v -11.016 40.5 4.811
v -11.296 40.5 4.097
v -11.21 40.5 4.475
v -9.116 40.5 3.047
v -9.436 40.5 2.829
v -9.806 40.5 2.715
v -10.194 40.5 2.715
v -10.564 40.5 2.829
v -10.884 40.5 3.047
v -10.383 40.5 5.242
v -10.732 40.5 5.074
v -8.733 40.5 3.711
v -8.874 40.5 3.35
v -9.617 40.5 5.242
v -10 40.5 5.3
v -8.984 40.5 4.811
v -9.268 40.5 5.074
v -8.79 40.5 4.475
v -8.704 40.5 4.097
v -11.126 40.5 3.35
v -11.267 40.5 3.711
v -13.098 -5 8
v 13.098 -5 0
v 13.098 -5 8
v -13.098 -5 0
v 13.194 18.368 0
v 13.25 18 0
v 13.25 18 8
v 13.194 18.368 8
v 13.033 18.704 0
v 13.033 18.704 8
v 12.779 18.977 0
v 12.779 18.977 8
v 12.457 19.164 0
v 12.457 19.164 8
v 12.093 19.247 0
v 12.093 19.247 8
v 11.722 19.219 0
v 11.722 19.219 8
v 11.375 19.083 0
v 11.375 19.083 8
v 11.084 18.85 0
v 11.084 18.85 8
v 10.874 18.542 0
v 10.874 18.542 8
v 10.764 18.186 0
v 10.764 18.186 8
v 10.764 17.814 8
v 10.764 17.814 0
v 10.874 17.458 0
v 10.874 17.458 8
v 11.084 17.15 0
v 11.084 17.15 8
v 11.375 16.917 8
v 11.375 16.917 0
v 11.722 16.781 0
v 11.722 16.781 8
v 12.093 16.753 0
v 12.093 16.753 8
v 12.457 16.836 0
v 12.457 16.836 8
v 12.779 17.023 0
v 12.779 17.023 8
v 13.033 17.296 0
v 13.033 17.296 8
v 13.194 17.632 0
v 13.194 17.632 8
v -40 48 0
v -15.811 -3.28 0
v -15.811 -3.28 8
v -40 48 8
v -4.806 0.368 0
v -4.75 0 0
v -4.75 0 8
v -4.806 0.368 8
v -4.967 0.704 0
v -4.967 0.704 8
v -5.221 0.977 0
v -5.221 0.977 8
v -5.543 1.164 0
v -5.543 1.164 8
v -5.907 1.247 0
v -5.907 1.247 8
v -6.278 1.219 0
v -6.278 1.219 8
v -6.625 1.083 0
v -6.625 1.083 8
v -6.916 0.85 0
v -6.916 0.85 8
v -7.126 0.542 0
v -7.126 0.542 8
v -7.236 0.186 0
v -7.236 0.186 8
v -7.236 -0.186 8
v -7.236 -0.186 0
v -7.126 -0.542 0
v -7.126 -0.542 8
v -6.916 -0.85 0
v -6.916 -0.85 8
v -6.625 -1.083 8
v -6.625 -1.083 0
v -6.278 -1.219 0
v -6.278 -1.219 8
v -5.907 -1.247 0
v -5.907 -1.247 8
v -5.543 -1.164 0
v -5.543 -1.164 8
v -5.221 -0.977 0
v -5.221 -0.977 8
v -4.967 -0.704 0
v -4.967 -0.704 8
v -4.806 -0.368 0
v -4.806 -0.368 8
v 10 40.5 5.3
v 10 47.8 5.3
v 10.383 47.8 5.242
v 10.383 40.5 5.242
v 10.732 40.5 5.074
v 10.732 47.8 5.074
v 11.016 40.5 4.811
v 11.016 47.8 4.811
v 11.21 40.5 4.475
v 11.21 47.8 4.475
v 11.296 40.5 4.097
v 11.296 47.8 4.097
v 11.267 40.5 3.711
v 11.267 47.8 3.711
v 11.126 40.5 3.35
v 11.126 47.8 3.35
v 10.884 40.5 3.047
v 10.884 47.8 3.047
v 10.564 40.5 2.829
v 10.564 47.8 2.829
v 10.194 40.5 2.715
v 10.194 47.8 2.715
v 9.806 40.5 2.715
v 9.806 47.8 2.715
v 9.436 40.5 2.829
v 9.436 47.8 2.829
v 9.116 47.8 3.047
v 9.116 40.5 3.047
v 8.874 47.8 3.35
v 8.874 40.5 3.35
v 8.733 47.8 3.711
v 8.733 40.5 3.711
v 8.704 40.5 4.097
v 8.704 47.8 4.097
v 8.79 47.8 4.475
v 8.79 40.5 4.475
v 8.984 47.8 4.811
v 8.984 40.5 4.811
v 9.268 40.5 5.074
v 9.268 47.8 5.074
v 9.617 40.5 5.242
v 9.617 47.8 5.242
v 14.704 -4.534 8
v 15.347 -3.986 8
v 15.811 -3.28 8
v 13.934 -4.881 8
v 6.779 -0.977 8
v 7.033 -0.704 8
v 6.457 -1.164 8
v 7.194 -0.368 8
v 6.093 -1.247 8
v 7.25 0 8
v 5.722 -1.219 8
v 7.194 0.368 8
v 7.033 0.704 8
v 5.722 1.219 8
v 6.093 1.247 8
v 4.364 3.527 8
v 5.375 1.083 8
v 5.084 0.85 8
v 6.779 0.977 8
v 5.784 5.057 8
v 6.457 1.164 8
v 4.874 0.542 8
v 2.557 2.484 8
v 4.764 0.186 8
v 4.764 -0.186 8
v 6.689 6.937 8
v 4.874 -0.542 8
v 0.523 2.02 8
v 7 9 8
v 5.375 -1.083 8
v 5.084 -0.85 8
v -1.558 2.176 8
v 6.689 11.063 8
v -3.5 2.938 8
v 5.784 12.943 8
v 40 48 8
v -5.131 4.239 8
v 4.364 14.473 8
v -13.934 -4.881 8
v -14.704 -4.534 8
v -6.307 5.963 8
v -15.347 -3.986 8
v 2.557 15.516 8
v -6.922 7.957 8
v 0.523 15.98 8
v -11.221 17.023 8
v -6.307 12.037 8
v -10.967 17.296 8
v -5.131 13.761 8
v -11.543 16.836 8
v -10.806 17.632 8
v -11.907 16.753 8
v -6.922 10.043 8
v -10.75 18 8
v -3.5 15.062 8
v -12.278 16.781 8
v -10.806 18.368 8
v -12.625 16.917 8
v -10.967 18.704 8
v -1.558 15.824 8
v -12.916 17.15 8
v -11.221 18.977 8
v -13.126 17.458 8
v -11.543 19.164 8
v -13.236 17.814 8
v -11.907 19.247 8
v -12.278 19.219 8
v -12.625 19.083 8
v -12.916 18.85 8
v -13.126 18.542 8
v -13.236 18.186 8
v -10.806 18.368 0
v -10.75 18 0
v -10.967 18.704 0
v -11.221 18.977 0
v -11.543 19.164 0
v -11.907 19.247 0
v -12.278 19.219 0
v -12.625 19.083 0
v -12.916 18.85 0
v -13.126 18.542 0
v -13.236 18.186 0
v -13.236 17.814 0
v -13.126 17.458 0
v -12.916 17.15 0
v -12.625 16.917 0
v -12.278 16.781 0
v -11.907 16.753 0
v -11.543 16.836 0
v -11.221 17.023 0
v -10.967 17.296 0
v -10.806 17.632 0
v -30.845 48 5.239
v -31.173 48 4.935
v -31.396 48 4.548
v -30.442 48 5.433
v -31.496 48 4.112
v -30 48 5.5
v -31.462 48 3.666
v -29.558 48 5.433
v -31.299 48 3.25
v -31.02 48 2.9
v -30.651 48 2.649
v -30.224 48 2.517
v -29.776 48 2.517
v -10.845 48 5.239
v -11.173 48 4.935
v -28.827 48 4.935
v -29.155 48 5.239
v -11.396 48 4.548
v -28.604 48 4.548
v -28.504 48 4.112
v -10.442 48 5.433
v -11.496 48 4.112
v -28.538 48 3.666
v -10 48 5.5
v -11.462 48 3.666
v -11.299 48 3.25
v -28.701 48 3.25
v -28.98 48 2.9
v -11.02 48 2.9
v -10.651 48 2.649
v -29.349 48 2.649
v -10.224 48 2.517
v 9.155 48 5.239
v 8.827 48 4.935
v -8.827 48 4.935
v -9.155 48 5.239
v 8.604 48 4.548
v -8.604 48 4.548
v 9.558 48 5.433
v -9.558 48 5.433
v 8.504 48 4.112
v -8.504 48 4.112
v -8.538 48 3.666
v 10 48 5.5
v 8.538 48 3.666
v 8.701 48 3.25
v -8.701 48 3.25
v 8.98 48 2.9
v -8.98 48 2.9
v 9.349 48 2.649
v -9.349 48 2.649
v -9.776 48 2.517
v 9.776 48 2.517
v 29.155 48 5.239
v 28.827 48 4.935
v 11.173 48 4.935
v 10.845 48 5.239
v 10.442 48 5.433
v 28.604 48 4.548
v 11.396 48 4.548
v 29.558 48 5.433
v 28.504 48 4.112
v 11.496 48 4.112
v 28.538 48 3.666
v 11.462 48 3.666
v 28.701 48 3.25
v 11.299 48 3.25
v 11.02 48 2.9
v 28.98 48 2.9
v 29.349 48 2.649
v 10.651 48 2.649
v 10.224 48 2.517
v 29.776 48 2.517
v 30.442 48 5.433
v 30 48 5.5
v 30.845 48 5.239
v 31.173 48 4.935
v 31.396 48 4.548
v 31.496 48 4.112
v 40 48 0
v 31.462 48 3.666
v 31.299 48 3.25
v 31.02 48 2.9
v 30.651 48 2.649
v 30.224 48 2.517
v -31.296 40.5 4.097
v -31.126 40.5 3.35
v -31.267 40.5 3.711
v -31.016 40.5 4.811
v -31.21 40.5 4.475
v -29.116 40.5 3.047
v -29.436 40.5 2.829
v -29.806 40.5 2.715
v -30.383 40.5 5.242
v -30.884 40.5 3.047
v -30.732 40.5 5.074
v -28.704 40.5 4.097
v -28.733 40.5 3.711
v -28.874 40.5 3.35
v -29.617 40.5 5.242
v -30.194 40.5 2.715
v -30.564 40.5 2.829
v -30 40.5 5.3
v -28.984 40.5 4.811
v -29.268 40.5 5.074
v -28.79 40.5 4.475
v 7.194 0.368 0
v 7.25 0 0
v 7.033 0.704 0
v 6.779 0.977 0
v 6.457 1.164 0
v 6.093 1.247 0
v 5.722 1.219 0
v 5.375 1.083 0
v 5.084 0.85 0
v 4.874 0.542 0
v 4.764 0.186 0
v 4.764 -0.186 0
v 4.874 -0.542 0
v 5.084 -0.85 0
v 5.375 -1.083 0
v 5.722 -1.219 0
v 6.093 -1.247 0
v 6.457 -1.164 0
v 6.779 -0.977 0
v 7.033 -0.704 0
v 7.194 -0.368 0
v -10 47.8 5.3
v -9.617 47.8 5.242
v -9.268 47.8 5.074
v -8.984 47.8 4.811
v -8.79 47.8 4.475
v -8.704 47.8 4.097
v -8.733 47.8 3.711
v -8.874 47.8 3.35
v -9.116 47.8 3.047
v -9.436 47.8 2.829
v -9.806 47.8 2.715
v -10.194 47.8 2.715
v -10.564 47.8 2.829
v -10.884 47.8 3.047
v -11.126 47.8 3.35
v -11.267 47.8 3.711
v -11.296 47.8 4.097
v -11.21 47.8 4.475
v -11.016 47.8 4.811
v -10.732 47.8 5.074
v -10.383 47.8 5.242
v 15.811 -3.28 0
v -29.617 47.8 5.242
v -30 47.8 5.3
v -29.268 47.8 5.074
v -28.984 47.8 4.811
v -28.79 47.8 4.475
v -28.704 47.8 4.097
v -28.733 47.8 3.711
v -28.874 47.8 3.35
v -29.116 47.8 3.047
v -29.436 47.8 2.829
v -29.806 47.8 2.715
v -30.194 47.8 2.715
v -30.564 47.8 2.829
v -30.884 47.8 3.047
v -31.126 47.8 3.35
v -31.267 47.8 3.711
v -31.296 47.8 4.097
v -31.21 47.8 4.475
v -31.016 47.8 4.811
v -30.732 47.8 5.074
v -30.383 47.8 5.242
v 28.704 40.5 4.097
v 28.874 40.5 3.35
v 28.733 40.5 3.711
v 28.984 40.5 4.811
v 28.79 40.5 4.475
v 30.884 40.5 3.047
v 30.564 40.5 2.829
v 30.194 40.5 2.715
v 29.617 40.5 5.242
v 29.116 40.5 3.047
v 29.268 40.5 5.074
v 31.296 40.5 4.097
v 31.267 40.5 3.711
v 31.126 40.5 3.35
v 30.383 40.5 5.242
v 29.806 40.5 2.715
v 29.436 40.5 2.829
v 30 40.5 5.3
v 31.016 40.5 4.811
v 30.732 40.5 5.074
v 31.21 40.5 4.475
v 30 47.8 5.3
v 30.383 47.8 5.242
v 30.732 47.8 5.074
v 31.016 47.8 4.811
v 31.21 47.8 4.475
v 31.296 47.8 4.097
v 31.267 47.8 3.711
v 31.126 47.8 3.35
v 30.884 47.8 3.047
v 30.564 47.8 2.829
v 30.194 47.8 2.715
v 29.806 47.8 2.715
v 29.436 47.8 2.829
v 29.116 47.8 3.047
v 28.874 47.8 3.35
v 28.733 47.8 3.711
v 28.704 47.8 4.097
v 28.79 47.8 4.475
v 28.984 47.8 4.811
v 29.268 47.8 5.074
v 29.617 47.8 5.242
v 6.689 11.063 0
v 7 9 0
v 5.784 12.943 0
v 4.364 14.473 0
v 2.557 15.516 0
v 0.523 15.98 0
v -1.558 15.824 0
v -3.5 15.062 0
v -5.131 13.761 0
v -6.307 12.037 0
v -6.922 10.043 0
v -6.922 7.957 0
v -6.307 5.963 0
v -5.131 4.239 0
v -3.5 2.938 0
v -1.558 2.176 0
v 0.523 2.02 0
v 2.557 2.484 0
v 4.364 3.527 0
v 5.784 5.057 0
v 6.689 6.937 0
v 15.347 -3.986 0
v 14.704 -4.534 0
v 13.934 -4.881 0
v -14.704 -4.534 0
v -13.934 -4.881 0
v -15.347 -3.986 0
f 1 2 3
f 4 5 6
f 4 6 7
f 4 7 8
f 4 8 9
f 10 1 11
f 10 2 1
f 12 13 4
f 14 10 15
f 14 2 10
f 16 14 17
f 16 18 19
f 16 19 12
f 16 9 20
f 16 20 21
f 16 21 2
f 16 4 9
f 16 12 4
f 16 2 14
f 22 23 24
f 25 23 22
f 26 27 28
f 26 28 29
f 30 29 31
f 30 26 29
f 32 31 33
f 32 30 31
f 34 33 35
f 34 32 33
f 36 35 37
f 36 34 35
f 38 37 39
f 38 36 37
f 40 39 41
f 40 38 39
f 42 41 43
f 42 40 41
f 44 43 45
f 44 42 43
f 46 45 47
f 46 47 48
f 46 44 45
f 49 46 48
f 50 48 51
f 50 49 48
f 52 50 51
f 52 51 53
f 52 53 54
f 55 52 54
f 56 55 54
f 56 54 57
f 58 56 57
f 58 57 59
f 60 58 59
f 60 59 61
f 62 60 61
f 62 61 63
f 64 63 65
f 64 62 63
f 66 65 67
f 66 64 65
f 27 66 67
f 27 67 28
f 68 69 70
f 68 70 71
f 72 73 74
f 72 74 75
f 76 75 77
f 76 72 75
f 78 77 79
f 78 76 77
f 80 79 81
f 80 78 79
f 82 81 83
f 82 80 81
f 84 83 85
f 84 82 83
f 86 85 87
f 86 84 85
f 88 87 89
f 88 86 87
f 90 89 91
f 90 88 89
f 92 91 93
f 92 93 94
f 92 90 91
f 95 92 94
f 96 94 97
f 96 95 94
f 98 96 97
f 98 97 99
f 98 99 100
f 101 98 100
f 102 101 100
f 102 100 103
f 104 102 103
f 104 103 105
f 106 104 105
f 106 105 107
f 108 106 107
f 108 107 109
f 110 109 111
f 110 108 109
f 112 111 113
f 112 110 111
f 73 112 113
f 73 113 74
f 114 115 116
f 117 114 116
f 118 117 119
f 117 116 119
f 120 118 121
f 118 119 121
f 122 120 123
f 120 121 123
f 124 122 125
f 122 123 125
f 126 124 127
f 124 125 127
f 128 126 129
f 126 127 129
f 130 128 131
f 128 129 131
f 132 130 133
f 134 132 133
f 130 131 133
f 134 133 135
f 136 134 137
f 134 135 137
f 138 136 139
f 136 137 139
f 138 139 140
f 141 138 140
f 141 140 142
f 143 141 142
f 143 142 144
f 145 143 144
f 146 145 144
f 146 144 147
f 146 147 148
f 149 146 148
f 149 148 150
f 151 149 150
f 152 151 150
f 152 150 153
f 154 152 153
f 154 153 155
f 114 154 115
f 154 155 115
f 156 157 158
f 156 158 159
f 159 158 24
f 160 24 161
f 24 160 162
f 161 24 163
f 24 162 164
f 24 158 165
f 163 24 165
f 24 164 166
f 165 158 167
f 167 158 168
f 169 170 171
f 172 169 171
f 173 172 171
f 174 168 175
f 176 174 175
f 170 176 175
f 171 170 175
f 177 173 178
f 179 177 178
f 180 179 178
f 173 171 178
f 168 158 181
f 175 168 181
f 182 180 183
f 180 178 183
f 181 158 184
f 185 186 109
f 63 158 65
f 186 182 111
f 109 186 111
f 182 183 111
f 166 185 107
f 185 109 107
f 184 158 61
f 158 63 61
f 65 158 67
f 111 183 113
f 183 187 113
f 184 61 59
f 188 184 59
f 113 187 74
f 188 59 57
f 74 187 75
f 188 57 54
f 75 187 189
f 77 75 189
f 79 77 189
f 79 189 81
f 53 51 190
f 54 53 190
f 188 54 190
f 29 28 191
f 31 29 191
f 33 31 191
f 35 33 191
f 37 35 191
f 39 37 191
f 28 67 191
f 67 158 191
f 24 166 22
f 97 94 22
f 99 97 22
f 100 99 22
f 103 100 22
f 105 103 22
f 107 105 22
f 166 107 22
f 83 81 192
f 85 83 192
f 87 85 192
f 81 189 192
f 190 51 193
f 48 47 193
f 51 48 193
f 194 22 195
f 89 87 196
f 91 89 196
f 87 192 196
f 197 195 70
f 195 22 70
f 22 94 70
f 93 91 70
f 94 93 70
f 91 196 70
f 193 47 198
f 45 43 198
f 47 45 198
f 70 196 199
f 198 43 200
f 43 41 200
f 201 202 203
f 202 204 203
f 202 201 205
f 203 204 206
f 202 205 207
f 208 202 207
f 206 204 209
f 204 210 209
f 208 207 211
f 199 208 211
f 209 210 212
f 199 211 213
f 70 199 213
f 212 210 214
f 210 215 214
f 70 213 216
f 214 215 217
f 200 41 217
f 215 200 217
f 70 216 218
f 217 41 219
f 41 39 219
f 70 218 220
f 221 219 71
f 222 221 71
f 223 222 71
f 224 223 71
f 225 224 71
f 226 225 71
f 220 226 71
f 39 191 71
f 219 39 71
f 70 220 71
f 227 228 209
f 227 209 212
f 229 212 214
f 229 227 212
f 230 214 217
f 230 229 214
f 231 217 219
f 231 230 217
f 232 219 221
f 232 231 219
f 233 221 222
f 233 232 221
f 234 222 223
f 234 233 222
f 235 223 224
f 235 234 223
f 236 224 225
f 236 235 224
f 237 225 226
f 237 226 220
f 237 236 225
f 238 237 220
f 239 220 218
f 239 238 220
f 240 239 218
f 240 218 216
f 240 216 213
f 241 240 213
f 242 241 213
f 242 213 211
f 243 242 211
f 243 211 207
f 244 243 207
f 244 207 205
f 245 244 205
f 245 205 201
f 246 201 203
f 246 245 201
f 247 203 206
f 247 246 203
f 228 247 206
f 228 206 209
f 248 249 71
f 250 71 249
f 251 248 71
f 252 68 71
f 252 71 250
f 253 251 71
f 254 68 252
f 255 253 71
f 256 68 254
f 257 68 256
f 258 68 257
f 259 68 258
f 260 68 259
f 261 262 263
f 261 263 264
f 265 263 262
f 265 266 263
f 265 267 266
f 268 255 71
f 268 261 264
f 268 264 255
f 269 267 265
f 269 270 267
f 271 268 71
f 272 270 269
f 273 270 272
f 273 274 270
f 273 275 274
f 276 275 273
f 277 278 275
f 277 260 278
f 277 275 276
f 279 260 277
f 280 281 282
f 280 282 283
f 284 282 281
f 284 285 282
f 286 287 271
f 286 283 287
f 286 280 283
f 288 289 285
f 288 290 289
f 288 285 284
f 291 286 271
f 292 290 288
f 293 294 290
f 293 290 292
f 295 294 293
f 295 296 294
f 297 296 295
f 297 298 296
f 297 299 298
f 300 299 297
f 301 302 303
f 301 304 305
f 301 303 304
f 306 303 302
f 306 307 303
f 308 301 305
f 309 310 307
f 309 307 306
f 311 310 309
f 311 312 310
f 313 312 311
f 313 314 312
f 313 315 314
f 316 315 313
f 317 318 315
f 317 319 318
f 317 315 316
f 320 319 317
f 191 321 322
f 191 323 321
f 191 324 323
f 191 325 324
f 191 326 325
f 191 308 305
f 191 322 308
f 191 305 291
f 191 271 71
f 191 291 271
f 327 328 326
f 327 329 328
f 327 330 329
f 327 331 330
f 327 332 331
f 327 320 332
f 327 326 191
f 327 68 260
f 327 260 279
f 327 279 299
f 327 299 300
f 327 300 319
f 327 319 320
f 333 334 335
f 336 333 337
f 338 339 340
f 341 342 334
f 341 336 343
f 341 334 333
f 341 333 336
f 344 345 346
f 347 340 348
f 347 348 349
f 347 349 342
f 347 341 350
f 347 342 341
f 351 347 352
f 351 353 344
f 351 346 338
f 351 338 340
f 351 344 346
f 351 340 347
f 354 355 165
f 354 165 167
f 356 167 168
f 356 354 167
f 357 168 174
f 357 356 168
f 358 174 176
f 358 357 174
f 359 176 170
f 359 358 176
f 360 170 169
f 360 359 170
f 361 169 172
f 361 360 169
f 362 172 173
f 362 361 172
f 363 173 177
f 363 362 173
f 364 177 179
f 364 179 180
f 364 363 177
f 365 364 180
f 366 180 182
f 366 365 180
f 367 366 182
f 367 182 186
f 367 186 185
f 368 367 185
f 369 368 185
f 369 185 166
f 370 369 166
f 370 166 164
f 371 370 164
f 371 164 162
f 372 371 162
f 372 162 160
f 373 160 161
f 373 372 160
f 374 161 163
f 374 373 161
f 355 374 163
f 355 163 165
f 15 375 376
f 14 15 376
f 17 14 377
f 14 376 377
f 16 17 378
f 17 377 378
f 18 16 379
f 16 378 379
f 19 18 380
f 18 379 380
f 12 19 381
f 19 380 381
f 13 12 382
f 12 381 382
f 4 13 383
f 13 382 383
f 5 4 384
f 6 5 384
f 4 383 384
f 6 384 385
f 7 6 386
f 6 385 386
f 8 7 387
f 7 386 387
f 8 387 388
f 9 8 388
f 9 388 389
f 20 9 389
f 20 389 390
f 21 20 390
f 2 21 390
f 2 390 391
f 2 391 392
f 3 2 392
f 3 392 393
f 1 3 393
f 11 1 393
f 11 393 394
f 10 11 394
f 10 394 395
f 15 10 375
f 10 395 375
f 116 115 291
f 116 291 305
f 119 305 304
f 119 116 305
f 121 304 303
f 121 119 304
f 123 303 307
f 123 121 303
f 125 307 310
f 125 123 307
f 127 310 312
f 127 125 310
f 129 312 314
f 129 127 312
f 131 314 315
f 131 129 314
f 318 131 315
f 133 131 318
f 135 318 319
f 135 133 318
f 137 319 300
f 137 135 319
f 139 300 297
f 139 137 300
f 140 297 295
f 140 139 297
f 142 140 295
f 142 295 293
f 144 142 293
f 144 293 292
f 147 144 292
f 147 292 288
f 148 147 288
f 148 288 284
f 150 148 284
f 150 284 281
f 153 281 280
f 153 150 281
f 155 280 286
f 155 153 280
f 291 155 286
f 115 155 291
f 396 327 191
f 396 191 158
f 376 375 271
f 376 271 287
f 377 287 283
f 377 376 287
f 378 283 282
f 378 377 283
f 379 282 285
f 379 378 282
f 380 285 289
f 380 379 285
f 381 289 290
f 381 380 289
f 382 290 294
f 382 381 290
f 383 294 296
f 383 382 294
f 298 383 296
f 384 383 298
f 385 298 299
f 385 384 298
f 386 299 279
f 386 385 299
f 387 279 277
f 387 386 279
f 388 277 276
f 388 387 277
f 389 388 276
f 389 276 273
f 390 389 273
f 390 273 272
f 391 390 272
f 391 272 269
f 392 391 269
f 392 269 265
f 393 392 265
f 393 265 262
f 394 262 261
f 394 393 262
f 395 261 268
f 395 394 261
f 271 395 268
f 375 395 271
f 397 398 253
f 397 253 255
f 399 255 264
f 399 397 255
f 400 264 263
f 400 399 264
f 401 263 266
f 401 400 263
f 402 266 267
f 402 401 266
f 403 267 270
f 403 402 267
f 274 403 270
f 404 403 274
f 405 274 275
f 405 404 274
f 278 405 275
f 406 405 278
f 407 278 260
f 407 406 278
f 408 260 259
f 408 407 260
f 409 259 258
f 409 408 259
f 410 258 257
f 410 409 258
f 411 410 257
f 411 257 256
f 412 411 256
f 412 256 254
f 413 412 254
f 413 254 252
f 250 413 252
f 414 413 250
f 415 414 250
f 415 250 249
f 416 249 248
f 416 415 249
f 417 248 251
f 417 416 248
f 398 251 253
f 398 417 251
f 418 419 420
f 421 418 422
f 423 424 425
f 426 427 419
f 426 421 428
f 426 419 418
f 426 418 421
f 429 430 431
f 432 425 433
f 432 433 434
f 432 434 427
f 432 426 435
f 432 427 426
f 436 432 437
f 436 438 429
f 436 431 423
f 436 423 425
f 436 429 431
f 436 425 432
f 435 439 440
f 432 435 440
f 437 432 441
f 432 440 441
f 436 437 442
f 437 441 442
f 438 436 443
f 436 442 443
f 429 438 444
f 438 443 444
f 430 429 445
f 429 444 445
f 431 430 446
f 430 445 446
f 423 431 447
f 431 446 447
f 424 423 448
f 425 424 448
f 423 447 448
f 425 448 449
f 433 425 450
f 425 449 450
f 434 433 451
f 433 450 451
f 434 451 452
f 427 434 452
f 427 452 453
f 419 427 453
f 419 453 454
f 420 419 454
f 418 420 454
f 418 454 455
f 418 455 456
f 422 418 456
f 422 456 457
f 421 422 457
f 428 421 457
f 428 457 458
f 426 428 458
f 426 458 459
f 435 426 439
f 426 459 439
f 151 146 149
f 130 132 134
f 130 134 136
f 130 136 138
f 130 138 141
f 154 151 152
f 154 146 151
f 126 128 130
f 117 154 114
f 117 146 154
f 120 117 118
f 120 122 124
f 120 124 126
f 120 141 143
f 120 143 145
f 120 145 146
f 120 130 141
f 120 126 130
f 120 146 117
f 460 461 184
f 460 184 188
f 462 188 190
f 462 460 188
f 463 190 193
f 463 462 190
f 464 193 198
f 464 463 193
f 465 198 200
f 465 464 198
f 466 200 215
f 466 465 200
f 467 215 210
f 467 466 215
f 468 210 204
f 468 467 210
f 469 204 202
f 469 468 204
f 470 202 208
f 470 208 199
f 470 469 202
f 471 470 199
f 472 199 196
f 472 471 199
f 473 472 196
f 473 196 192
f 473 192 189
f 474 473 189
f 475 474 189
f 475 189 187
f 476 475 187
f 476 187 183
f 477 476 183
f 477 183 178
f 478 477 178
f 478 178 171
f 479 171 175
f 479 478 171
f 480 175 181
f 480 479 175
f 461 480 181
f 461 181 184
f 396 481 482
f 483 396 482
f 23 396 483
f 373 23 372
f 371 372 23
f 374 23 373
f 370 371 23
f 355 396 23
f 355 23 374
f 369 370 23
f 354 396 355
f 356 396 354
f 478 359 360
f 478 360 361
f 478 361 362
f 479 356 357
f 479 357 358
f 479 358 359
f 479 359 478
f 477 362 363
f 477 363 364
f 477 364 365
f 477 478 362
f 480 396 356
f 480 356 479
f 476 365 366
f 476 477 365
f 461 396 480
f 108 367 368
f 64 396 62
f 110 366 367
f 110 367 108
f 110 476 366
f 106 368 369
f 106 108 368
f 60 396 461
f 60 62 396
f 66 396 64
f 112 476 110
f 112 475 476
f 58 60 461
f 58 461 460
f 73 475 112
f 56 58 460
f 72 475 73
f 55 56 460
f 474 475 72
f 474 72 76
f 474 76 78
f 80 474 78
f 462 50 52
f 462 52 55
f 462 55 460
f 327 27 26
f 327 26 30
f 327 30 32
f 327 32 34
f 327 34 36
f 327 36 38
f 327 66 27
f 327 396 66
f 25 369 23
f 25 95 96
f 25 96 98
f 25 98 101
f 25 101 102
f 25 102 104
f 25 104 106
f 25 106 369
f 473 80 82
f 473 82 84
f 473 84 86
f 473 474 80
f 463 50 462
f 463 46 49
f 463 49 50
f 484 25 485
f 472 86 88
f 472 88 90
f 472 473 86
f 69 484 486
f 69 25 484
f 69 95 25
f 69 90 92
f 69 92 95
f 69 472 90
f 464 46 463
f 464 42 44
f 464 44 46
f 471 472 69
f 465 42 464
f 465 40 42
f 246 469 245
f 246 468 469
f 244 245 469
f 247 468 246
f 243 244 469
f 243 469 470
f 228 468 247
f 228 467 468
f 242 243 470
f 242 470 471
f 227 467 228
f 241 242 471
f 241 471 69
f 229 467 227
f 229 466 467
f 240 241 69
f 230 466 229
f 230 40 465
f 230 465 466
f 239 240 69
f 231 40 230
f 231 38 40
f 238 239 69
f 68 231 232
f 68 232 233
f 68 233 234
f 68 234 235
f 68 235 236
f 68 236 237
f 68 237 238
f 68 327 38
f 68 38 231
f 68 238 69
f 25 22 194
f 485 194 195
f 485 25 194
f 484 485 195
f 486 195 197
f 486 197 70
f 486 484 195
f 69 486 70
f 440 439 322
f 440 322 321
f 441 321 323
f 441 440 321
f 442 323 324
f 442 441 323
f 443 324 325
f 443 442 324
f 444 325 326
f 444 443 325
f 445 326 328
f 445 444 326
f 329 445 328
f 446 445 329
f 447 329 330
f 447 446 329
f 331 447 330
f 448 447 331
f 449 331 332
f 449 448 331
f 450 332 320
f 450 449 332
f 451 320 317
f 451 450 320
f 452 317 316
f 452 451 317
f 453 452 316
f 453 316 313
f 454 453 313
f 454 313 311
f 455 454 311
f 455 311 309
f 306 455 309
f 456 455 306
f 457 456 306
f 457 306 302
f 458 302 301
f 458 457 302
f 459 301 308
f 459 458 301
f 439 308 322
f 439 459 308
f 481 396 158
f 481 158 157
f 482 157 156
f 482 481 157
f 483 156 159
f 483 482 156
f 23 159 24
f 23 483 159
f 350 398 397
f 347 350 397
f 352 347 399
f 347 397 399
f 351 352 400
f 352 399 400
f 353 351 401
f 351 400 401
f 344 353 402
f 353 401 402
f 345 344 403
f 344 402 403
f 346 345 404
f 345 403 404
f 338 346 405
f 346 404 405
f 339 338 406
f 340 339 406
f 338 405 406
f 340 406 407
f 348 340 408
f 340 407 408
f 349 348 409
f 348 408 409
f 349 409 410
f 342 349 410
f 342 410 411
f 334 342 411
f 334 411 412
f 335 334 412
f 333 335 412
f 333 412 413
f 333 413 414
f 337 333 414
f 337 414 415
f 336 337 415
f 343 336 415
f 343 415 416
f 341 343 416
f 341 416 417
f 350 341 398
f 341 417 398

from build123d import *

# Parameters (mm, degrees)
SKETCH_1_R          = 1.25
SKETCH_1_R_2        = 7
EXTRUDE_1_DEPTH     = 8
SKETCH_2_R          = 1.3
CUT_EXTRUDE_1_DEPTH = 7.5
CHAMFER_1_SIZE      = 0.2


with BuildPart() as part:
    # 草圖1 → 填料-伸長1 (new body)
    with BuildSketch(Plane.XY):
        with BuildLine():
            Line((0, -5), (-13.098093889, -5))
            ThreePointArc((-13.098093889, -5), (-14.704398953, -4.533729275), (-15.811388666, -3.279856027))
            Line((-15.811388666, -3.279856027), (-40, 48))
            Line((-40, 48), (0, 48))
            Line((0, 48), (40, 48))
            Line((40, 48), (15.811388666, -3.279856027))
            ThreePointArc((15.811388666, -3.279856027), (14.704398953, -4.533729275), (13.098093889, -5))
            Line((13.098093889, -5), (0, -5))
        make_face()
        with Locations((6, 0)):
            Circle(SKETCH_1_R, mode=Mode.SUBTRACT)
        with Locations((-6, 0)):
            Circle(SKETCH_1_R, mode=Mode.SUBTRACT)
        with Locations((-12, 18)):
            Circle(SKETCH_1_R, mode=Mode.SUBTRACT)
        with Locations((12, 18)):
            Circle(SKETCH_1_R, mode=Mode.SUBTRACT)
        with Locations((0, 9)):
            Circle(SKETCH_1_R_2, mode=Mode.SUBTRACT)
    extrude(amount=EXTRUDE_1_DEPTH)

    # 草圖2 → 除料-伸長1 (cut)
    with BuildSketch(Plane(origin=(0, 48, 0), x_dir=(1, 0, 0), z_dir=(0, 1, 0))):
        with Locations(Location((-10, -4, 0), (0, 0, 270))):
            Circle(SKETCH_2_R)
        with Locations(Location((-30, -4, 0), (0, 0, 270))):
            Circle(SKETCH_2_R)
        with Locations(Location((10, -4, 0), (0, 0, 270))):
            Circle(SKETCH_2_R)
        with Locations(Location((30, -4, 0), (0, 0, 270))):
            Circle(SKETCH_2_R)
    extrude(amount=-CUT_EXTRUDE_1_DEPTH, mode=Mode.SUBTRACT)

    # 導角1
    chamfer_1_edges = [part.edges().sort_by_distance(p)[0] for p in [
        (30, 48, 2.7),
        (10, 48, 2.7),
        (-30, 48, 2.7),
        (-10, 48, 2.7),
    ]]
    chamfer(chamfer_1_edges, length=CHAMFER_1_SIZE)


solid = part.part
